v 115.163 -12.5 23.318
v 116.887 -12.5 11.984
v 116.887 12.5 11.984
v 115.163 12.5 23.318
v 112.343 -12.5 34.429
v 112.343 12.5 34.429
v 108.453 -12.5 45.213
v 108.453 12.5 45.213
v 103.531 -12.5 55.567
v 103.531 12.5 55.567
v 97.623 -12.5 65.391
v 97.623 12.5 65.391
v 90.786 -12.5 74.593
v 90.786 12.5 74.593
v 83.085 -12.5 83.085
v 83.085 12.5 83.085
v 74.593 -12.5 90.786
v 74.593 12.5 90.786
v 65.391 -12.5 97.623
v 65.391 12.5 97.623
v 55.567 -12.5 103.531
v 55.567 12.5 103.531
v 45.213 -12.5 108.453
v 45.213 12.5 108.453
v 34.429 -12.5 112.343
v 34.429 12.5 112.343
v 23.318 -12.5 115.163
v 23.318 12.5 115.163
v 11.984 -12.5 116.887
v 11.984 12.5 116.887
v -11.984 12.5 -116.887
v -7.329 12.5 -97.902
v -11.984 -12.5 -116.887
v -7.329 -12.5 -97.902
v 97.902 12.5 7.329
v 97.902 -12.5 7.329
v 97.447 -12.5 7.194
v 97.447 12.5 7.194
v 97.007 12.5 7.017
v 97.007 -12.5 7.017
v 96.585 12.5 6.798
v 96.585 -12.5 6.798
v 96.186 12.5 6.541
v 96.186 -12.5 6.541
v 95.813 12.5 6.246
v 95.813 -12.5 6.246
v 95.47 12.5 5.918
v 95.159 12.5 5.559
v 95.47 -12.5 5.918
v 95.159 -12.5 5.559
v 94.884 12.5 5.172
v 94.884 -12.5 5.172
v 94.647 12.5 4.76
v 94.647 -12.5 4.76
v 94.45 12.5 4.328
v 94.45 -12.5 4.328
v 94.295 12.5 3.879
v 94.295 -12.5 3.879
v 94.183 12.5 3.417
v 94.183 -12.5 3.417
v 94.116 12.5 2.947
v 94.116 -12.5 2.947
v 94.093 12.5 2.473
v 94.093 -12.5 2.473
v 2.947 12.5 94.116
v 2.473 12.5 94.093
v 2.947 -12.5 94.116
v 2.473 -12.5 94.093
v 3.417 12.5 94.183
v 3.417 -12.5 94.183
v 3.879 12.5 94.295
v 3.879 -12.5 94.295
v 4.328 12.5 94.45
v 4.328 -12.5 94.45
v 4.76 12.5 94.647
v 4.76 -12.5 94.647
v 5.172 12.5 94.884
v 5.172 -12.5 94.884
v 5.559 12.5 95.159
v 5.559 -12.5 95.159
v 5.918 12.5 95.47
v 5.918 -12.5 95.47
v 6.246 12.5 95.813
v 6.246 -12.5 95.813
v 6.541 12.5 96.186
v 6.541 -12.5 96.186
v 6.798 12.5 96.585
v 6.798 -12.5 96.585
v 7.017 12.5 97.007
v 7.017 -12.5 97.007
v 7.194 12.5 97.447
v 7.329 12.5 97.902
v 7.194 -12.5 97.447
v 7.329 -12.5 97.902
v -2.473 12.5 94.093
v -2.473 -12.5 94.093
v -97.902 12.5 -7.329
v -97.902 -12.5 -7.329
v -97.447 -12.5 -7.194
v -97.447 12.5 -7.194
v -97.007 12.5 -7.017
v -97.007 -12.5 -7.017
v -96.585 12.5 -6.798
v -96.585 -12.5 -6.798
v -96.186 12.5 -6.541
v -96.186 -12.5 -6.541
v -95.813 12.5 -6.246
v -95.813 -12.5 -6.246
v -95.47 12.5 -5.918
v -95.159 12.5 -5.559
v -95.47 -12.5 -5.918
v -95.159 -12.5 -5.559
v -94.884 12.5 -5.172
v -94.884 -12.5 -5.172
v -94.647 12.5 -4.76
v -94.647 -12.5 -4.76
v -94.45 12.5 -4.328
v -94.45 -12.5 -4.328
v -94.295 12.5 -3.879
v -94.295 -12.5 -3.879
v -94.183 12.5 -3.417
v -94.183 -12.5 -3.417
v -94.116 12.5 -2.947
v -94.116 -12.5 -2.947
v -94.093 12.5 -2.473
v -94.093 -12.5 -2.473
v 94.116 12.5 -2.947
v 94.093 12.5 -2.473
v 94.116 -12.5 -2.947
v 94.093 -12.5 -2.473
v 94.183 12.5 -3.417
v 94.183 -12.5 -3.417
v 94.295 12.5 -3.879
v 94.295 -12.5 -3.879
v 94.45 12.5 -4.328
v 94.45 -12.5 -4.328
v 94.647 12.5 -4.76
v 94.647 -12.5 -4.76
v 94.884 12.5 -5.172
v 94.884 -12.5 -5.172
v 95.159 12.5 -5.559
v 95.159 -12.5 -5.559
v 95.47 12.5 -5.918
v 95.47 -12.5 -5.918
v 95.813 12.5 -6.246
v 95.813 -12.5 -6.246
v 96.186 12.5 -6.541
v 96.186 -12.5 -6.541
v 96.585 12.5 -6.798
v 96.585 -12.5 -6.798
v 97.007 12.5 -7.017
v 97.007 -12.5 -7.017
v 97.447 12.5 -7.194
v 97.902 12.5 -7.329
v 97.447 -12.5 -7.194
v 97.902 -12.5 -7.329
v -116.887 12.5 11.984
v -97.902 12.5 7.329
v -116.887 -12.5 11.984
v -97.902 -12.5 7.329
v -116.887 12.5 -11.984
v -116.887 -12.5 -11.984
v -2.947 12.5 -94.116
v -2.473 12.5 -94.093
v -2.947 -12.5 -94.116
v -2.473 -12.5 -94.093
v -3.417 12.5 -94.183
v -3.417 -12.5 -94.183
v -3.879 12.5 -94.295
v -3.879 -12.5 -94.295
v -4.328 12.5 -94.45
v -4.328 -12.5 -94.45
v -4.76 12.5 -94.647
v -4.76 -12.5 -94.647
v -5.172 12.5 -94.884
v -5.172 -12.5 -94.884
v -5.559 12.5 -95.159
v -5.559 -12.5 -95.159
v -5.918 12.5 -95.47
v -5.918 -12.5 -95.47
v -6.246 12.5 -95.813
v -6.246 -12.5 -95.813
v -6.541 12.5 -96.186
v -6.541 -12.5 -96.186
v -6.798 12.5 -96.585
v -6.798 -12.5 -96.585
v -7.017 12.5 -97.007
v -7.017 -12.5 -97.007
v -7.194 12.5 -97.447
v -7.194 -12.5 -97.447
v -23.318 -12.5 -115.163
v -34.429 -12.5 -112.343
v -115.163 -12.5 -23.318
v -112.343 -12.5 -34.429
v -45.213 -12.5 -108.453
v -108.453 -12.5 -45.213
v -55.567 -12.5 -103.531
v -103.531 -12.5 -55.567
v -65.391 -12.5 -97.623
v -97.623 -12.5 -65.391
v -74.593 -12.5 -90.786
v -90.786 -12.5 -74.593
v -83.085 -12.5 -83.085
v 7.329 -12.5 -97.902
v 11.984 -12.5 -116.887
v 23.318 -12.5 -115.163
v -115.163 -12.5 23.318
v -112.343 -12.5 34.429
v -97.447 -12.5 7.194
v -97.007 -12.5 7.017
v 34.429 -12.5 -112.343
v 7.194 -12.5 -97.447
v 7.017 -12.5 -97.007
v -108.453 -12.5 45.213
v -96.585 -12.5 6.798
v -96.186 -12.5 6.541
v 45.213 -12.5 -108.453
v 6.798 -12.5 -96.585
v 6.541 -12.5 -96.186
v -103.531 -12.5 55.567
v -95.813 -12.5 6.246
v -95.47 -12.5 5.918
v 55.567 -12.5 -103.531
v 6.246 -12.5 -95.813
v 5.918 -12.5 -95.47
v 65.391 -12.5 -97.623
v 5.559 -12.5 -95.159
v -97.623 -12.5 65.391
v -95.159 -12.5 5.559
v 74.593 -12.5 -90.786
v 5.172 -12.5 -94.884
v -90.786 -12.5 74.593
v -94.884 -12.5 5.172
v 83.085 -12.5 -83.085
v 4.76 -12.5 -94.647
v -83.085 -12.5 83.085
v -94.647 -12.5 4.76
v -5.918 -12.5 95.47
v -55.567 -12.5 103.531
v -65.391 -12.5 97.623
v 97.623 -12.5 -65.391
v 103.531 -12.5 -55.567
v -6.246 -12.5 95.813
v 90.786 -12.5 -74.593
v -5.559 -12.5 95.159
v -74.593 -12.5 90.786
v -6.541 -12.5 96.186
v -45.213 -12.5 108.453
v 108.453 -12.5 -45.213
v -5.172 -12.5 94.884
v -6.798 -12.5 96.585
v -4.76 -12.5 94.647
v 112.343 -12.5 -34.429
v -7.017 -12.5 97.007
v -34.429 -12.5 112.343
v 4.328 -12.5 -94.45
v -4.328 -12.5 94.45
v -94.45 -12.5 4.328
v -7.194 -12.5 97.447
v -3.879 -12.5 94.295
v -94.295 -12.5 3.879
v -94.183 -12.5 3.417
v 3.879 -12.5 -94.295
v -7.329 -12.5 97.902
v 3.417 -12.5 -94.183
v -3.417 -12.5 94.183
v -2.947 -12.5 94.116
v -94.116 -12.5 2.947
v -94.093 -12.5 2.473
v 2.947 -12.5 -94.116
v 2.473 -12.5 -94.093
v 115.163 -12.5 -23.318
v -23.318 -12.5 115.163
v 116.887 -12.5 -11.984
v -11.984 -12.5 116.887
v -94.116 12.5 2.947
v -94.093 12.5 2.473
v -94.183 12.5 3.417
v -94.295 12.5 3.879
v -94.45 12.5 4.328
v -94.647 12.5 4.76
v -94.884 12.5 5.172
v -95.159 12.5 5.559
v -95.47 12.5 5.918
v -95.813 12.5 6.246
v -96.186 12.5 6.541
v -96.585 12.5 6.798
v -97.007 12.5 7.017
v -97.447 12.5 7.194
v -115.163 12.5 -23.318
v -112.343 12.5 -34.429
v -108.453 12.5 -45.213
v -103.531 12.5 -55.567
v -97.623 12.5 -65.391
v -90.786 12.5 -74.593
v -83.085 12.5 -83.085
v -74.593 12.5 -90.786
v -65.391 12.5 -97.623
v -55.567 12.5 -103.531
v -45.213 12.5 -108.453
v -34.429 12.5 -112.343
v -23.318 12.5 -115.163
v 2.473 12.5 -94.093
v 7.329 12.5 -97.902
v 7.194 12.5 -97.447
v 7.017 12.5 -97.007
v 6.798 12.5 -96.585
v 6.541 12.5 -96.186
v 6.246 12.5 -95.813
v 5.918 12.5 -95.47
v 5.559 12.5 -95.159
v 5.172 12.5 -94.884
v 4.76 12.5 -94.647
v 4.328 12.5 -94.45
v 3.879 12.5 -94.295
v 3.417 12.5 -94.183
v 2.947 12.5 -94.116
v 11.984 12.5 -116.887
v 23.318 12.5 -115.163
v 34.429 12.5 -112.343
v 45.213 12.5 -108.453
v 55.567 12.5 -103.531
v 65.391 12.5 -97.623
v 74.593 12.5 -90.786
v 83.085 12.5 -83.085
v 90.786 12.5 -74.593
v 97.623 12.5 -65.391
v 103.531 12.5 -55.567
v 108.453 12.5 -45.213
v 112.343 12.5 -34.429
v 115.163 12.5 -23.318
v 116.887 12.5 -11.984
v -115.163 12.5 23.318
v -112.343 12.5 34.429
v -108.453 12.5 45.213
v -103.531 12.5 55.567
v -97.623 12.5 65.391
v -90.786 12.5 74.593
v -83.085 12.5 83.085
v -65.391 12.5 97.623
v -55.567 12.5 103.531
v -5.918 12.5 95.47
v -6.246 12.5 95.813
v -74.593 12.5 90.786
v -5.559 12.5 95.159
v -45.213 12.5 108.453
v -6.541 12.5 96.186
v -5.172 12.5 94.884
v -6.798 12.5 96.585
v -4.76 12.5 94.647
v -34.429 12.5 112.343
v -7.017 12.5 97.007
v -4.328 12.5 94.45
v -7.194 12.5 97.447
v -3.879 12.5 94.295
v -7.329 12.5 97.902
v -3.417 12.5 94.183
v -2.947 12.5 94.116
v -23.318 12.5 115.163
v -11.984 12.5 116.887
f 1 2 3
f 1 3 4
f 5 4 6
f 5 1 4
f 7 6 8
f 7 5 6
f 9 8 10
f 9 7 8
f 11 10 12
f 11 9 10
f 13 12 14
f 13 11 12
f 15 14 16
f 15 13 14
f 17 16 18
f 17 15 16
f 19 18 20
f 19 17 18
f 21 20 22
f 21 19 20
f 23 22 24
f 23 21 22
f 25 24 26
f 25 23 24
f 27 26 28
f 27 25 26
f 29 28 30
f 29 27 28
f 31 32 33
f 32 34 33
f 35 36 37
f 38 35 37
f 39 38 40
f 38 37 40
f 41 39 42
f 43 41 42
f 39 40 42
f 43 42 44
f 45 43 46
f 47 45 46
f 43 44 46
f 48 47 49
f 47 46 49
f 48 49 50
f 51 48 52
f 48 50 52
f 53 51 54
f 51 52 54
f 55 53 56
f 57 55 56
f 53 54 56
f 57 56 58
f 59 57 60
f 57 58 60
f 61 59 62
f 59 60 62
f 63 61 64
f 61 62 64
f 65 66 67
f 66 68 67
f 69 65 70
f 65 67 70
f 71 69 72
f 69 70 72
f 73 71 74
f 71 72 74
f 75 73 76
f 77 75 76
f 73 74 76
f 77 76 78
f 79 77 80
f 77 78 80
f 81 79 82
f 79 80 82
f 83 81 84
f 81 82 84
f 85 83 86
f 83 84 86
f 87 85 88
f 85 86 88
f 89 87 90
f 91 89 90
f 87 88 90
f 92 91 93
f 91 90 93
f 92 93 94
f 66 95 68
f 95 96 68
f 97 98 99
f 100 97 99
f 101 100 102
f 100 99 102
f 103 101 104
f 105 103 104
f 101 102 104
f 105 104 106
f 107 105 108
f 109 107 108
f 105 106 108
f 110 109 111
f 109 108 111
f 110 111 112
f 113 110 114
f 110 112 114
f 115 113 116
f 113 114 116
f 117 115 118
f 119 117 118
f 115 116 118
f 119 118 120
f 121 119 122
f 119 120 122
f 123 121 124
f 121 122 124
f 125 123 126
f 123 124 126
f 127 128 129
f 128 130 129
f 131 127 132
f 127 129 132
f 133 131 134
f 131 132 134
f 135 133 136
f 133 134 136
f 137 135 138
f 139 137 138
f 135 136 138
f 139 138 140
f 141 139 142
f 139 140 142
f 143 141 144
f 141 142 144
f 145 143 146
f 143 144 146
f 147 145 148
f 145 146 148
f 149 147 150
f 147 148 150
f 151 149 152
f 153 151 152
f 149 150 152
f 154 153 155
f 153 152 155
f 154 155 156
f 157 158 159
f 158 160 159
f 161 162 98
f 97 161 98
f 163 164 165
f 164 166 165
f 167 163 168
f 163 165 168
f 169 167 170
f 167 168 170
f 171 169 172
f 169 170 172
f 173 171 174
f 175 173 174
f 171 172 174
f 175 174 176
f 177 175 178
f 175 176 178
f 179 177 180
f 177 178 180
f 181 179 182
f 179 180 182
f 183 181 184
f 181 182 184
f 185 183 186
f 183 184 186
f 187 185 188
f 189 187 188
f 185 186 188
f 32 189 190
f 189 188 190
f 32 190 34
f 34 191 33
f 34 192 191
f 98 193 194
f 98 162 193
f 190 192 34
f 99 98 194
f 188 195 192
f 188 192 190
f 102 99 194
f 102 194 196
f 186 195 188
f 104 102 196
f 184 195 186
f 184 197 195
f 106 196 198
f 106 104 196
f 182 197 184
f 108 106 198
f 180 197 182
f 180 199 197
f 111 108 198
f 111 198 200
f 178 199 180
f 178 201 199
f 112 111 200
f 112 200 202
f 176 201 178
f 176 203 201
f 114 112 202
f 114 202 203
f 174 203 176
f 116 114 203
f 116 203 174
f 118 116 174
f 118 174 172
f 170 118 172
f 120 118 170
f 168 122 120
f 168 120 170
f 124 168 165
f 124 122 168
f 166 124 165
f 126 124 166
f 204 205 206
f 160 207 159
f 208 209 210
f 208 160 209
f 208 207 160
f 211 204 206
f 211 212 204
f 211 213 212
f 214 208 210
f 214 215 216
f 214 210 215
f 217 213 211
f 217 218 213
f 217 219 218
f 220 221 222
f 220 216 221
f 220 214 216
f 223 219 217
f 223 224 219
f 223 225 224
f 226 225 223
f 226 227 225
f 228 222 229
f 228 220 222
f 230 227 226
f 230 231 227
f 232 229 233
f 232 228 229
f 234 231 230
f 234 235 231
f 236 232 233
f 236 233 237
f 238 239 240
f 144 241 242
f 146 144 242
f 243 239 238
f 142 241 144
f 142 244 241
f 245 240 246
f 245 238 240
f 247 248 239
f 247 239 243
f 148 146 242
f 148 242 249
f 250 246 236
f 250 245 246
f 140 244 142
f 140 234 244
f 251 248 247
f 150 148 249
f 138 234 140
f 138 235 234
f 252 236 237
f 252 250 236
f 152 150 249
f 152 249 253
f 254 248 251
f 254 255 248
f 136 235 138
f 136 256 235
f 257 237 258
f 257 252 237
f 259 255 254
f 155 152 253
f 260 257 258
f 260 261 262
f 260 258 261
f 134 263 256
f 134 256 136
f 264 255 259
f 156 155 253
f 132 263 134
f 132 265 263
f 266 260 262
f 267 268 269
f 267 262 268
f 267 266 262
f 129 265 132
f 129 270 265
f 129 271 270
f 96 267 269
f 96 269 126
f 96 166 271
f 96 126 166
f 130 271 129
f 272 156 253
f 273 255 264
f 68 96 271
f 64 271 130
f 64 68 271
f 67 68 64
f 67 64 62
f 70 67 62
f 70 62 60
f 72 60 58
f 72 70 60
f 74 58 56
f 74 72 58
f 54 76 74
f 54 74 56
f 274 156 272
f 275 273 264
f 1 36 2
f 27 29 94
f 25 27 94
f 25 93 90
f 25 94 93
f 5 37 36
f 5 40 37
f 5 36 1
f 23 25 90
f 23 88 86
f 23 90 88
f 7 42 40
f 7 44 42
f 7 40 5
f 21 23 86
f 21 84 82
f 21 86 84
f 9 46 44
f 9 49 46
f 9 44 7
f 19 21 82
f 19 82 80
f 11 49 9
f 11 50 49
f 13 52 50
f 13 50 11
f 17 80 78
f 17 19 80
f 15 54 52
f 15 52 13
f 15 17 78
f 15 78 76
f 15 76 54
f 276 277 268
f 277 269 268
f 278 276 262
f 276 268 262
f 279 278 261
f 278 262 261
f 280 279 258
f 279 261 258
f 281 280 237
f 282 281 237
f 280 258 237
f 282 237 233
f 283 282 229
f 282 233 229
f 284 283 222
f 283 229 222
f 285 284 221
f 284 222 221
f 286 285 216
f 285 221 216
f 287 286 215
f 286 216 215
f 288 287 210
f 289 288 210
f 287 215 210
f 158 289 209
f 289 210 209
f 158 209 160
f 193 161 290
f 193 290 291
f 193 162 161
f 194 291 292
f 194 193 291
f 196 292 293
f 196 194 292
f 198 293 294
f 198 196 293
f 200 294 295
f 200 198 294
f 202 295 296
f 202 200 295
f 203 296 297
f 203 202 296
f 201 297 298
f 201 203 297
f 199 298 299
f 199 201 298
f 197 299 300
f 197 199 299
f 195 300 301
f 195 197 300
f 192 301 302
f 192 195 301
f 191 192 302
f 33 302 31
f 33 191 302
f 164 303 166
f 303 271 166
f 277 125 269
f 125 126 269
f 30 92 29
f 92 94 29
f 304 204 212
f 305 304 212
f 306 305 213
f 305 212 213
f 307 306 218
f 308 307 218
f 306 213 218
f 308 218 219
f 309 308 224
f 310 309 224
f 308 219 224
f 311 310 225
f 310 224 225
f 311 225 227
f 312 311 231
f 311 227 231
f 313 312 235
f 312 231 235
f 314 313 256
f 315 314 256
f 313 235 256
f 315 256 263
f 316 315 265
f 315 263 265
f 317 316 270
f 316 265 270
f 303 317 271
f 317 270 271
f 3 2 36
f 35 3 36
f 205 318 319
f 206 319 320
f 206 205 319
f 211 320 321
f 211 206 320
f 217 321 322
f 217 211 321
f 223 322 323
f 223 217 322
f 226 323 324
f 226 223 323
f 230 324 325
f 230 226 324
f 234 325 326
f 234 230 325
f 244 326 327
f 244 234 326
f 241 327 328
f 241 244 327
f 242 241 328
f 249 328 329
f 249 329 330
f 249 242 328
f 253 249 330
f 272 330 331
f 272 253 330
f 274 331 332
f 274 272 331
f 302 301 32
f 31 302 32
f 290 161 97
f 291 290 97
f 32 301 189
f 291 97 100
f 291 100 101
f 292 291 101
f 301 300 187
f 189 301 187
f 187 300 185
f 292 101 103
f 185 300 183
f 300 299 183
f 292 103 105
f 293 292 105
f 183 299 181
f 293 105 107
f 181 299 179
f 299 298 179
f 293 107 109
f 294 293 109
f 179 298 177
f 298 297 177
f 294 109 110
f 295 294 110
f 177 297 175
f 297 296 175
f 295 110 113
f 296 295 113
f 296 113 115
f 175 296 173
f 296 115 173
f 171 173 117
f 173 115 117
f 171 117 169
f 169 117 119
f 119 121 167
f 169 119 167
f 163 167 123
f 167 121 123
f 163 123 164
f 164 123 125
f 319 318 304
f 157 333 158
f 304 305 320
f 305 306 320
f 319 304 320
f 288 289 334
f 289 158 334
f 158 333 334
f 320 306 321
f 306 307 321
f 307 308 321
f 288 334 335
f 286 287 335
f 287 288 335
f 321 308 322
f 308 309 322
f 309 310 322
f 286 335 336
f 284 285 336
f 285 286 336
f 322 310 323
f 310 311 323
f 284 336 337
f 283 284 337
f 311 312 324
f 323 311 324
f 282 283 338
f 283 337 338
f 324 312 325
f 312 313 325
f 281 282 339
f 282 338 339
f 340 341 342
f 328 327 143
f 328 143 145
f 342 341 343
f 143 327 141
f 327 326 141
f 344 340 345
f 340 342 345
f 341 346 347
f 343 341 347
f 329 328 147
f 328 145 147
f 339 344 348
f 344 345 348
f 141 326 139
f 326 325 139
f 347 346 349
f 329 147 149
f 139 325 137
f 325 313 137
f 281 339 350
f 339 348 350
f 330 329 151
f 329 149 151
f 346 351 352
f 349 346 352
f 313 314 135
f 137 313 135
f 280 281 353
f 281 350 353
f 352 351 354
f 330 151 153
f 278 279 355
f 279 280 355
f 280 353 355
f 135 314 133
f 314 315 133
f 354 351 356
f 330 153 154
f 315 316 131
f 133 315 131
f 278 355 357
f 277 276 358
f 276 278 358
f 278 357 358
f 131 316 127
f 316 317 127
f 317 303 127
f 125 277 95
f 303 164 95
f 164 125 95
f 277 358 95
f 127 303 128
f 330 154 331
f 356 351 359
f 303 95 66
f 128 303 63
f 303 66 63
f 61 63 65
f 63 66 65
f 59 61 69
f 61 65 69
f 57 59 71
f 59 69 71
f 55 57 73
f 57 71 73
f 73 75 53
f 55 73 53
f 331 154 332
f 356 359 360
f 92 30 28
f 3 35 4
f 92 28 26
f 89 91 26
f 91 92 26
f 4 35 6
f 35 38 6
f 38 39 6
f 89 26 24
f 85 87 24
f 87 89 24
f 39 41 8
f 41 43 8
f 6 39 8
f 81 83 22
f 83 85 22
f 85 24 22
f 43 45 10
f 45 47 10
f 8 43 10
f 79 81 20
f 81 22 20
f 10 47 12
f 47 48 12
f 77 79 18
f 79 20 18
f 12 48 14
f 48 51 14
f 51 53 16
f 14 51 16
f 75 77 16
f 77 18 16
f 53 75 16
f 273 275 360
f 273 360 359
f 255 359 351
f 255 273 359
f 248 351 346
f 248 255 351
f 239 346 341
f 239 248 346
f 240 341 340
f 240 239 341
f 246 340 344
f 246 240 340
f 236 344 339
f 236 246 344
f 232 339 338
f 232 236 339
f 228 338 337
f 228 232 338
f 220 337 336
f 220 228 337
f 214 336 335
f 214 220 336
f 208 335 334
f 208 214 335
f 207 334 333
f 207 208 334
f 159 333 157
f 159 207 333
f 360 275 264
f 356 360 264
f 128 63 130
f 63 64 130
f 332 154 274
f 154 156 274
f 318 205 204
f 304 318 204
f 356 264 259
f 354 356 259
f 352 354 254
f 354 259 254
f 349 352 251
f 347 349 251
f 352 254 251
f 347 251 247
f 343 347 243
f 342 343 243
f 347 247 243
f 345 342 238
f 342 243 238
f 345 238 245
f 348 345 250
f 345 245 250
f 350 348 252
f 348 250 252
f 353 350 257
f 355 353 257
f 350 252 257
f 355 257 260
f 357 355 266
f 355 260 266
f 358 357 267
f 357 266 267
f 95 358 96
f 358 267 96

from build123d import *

# Parameters (mm, degrees)
F0_R     = 117.5
F1_DEPTH = 12.5
F3_DEPTH = 12.5
F4_COUNT = 4


with BuildPart() as f1:
    # F0 (on Front) → F1 (new body, symmetric)
    with BuildSketch(Plane.XZ):
        Circle(F0_R)
    extrude(amount=F1_DEPTH, both=True)

    # F2 (on Front) → F3 (cut, symmetric)
    with BuildSketch(Plane.XZ):
        with BuildLine():
            Line((7.3289173795, 97.9024141661), (11.9843448736, 116.8872340247))
            ThreePointArc((11.9843448736, 116.8872340247), (0, 117.5), (-11.9843448736, 116.8872340247))
            Line((-11.9843448736, 116.8872340247), (-7.3289173795, 97.9024141661))
            ThreePointArc((-7.3289173795, 97.9024141661), (-5.5587216743, 95.1591403196), (-2.4727905872, 94.0932258964))
            Line((-2.4727905872, 94.0932258964), (2.4727905872, 94.0932258964))
            ThreePointArc((2.4727905872, 94.0932258964), (5.5587216743, 95.1591403196), (7.3289173795, 97.9024141661))
        make_face()
    f3 = extrude(amount=F3_DEPTH, both=True, mode=Mode.SUBTRACT)

    # F4: F3 ×4 about axis
    f4_axis = Axis((0, 0, 0), (0, -1, 0))
    for i in range(1, F4_COUNT):
        add(f3.rotate(f4_axis, i * 360 / F4_COUNT), mode=Mode.SUBTRACT)


solid = f1.part
